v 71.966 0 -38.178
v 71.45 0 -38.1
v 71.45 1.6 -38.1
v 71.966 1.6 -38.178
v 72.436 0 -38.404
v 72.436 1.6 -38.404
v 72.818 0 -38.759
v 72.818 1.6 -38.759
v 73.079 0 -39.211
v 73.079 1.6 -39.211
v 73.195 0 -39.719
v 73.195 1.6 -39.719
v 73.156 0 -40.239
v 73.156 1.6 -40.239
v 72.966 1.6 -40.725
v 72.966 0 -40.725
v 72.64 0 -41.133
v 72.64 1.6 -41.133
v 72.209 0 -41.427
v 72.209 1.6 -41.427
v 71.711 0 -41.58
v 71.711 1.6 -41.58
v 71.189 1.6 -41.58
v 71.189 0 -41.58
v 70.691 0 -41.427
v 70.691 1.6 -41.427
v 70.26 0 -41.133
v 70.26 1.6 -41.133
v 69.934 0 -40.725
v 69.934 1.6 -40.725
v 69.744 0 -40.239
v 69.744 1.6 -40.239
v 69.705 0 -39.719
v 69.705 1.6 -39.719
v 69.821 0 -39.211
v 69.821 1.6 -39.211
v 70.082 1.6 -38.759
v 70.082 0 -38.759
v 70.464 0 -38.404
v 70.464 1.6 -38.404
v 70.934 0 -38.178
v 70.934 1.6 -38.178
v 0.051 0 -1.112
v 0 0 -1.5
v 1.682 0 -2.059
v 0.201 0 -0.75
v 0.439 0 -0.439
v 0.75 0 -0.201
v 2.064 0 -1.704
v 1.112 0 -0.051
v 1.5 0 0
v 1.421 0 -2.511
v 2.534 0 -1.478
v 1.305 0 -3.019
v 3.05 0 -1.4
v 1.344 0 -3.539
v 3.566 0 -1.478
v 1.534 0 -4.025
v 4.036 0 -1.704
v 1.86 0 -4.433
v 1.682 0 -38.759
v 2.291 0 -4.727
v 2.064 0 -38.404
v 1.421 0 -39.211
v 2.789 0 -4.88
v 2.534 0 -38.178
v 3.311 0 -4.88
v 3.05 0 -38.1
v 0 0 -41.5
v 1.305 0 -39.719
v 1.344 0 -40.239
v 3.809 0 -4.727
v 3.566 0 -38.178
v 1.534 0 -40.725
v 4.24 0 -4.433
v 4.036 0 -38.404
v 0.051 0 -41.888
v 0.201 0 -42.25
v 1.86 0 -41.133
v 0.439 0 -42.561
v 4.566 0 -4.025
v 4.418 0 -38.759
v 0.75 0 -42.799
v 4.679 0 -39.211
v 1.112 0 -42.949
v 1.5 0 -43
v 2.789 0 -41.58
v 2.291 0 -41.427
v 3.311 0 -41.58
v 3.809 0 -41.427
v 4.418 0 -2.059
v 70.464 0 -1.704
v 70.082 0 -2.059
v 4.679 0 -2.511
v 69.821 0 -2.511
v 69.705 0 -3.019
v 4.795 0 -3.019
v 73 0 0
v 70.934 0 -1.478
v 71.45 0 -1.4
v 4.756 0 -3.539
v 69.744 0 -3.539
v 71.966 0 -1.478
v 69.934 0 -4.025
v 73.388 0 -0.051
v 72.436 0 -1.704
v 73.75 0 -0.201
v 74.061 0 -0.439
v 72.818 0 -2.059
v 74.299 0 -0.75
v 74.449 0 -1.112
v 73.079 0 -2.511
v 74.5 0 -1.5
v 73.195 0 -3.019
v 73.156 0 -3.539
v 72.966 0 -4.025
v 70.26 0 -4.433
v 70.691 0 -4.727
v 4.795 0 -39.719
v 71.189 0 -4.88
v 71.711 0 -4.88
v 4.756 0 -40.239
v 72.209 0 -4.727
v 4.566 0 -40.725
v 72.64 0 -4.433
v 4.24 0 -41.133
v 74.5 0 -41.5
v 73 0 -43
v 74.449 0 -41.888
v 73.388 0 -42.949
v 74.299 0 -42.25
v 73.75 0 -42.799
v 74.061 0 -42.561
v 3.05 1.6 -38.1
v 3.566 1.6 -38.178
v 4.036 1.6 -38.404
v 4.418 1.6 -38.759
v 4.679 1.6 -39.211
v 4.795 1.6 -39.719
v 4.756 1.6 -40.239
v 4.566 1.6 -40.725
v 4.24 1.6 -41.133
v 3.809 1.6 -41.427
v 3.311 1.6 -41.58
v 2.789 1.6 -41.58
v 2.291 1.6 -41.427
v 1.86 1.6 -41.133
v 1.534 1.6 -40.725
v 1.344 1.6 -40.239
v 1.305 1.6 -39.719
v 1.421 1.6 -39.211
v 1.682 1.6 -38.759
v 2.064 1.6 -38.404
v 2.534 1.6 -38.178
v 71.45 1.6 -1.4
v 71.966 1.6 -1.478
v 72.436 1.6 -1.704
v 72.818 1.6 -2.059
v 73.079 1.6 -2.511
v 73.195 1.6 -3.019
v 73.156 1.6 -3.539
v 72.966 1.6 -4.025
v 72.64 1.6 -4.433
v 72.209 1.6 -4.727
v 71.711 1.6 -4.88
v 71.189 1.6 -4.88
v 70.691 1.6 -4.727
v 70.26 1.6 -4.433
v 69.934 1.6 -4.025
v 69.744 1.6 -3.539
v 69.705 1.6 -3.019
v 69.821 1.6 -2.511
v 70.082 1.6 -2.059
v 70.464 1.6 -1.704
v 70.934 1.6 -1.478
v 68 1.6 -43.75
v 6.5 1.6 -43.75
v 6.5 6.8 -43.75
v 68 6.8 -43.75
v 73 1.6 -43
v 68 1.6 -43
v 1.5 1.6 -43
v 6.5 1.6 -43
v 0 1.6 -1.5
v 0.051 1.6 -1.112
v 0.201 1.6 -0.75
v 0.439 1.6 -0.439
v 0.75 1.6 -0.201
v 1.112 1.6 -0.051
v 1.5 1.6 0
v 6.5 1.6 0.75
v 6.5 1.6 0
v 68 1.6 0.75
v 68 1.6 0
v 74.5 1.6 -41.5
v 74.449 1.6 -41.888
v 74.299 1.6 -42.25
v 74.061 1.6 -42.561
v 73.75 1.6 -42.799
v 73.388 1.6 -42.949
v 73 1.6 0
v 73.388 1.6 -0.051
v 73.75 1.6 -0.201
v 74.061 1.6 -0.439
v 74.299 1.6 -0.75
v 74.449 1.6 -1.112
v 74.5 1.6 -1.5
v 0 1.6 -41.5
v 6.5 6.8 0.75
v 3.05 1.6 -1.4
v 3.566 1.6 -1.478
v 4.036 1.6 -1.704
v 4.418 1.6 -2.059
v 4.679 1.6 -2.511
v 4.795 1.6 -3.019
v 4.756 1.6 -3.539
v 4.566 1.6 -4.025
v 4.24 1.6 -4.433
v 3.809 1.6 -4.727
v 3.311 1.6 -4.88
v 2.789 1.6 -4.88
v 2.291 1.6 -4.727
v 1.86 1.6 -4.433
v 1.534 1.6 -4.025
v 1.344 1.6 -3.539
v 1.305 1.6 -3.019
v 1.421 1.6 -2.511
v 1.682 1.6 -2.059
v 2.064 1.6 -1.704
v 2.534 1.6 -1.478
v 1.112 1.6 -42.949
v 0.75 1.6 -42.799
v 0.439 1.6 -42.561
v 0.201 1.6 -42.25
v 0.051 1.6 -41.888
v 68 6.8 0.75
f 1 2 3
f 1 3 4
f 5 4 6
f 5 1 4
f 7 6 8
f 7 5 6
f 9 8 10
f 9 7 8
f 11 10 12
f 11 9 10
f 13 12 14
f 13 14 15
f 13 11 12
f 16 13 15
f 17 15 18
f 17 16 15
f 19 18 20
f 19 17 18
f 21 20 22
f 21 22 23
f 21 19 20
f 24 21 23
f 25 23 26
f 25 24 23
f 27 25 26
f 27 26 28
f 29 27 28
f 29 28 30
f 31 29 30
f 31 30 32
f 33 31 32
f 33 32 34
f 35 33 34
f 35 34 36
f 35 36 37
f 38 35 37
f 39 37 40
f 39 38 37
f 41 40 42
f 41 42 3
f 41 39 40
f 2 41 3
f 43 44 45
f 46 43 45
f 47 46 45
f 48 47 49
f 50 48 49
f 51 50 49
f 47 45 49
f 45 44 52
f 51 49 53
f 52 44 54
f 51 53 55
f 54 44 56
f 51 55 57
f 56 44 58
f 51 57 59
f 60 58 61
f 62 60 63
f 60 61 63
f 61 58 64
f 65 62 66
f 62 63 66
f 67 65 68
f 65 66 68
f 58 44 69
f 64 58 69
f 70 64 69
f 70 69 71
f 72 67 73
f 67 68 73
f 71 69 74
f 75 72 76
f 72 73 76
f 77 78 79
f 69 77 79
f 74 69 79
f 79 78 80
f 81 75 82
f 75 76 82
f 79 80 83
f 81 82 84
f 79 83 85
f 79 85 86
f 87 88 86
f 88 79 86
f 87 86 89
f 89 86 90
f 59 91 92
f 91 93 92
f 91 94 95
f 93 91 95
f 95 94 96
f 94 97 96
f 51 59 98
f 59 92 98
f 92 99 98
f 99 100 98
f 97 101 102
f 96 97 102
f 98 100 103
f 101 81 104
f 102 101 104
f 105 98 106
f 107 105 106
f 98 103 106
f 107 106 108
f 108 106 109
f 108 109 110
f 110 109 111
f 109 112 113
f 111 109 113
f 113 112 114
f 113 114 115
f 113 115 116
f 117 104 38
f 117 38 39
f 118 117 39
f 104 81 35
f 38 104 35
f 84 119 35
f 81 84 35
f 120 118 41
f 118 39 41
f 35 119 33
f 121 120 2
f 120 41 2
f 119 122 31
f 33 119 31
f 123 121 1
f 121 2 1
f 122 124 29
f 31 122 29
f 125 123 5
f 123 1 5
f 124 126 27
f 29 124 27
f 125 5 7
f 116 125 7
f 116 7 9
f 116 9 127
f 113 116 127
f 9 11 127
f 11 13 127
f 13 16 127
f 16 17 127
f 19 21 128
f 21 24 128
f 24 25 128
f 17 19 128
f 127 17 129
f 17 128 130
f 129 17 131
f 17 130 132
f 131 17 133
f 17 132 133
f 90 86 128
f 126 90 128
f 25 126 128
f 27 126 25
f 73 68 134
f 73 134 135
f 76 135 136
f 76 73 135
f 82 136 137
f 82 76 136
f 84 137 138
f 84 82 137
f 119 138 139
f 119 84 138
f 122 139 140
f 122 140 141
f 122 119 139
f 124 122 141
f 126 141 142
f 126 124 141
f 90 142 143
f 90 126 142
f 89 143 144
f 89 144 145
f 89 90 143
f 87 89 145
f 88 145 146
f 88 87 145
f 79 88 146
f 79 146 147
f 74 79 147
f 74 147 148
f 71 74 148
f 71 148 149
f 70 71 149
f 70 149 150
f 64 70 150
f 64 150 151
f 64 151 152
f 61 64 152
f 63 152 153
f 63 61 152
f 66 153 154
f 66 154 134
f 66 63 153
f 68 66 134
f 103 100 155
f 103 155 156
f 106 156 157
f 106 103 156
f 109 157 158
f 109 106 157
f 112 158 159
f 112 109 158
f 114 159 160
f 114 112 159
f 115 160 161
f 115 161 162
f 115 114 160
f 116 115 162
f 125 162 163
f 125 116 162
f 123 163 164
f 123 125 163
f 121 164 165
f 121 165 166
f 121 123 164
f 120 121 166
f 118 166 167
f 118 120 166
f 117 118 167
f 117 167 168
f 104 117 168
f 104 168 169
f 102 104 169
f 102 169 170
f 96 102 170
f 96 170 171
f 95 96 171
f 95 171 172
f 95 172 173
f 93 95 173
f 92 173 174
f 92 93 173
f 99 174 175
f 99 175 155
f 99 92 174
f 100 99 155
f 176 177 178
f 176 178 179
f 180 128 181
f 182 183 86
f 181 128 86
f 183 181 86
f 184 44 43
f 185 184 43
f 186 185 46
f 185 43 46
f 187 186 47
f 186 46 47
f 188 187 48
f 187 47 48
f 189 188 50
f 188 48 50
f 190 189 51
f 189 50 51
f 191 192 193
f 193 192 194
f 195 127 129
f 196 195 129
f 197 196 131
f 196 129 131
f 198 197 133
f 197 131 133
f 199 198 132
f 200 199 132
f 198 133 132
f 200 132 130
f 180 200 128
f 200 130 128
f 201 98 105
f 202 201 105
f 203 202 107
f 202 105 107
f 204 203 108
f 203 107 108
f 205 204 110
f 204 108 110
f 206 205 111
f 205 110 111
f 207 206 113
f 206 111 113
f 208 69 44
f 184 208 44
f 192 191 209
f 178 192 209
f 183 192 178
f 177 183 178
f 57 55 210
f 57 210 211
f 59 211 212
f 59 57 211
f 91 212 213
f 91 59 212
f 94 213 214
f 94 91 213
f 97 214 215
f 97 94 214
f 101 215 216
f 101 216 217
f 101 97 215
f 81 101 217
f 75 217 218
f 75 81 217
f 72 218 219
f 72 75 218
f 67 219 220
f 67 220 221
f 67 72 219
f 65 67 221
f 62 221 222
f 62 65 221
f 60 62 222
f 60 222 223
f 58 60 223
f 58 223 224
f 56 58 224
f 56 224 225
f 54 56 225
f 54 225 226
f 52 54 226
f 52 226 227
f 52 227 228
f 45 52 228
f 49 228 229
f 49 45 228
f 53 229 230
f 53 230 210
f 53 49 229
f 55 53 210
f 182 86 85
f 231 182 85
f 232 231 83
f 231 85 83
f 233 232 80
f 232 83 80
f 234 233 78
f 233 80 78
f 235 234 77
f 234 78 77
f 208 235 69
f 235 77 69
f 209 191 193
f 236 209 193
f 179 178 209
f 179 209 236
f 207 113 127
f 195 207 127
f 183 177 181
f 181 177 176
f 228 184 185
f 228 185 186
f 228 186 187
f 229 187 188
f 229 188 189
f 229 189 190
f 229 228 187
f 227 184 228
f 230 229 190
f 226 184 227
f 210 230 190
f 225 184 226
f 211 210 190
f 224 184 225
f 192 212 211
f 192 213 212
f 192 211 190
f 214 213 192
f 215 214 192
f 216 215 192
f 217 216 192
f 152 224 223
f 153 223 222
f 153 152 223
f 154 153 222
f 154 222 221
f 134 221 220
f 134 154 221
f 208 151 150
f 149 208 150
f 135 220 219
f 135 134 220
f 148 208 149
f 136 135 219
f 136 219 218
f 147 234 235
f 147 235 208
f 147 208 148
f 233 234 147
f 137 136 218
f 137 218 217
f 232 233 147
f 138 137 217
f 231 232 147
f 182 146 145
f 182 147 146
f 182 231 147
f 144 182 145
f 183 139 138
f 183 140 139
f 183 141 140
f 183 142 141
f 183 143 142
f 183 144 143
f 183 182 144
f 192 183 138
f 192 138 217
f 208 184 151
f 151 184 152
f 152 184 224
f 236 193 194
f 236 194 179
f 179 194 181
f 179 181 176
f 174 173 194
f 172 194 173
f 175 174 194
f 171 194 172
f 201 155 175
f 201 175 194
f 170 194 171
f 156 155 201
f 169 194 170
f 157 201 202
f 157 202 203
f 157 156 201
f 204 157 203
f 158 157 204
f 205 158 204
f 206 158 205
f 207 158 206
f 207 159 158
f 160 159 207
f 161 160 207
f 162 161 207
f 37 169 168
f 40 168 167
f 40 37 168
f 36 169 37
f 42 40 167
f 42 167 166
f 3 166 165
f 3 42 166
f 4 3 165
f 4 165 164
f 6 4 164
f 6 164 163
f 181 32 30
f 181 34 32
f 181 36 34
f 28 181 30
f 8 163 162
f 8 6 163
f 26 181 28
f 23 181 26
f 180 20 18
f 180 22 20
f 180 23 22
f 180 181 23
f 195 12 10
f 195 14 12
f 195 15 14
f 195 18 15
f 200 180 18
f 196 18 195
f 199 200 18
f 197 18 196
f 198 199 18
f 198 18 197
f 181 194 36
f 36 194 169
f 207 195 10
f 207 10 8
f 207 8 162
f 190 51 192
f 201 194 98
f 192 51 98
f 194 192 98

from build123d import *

# Parameters (mm, degrees)
SKETCH_1_R      = 1.75
EXTRUDE_1_DEPTH = 1.6
SKETCH_2_W      = 61.5
SKETCH_2_H      = 44.5
EXTRUDE_2_DEPTH = 5.2


with BuildPart() as part:
    # 草图1 → 凸台-拉伸1 (new body)
    with BuildSketch(Plane(origin=(0, 0, 0), x_dir=(1, 0, 0), z_dir=(0, 1, 0))):
        with BuildLine():
            Line((1.5, 0), (73, 0))
            ThreePointArc((73, 0), (74.060660172, 0.439339828), (74.5, 1.5))
            Line((74.5, 1.5), (74.5, 41.5))
            ThreePointArc((74.5, 41.5), (74.060660172, 42.560660172), (73, 43))
            Line((73, 43), (1.5, 43))
            ThreePointArc((1.5, 43), (0.439339828, 42.560660172), (0, 41.5))
            Line((0, 41.5), (0, 1.5))
            ThreePointArc((0, 1.5), (0.439339828, 0.439339828), (1.5, 0))
        make_face()
        with Locations(Location((3.05, 39.85, 0), (0, 0, 270))):
            Circle(SKETCH_1_R, mode=Mode.SUBTRACT)
        with Locations(Location((3.05, 3.15, 0), (0, 0, 270))):
            Circle(SKETCH_1_R, mode=Mode.SUBTRACT)
        with Locations(Location((71.45, 39.85, 0), (0, 0, 270))):
            Circle(SKETCH_1_R, mode=Mode.SUBTRACT)
        with Locations(Location((71.45, 3.15, 0), (0, 0, 270))):
            Circle(SKETCH_1_R, mode=Mode.SUBTRACT)
    extrude(amount=EXTRUDE_1_DEPTH)

    # 草图2 → 凸台-拉伸2 (add)
    with BuildSketch(Plane(origin=(0, 1.6, 0), x_dir=(1, 0, 0), z_dir=(0, 1, 0))):
        with Locations((37.25, 21.5)):
            Rectangle(SKETCH_2_W, SKETCH_2_H)
    extrude(amount=EXTRUDE_2_DEPTH)


solid = part.part
